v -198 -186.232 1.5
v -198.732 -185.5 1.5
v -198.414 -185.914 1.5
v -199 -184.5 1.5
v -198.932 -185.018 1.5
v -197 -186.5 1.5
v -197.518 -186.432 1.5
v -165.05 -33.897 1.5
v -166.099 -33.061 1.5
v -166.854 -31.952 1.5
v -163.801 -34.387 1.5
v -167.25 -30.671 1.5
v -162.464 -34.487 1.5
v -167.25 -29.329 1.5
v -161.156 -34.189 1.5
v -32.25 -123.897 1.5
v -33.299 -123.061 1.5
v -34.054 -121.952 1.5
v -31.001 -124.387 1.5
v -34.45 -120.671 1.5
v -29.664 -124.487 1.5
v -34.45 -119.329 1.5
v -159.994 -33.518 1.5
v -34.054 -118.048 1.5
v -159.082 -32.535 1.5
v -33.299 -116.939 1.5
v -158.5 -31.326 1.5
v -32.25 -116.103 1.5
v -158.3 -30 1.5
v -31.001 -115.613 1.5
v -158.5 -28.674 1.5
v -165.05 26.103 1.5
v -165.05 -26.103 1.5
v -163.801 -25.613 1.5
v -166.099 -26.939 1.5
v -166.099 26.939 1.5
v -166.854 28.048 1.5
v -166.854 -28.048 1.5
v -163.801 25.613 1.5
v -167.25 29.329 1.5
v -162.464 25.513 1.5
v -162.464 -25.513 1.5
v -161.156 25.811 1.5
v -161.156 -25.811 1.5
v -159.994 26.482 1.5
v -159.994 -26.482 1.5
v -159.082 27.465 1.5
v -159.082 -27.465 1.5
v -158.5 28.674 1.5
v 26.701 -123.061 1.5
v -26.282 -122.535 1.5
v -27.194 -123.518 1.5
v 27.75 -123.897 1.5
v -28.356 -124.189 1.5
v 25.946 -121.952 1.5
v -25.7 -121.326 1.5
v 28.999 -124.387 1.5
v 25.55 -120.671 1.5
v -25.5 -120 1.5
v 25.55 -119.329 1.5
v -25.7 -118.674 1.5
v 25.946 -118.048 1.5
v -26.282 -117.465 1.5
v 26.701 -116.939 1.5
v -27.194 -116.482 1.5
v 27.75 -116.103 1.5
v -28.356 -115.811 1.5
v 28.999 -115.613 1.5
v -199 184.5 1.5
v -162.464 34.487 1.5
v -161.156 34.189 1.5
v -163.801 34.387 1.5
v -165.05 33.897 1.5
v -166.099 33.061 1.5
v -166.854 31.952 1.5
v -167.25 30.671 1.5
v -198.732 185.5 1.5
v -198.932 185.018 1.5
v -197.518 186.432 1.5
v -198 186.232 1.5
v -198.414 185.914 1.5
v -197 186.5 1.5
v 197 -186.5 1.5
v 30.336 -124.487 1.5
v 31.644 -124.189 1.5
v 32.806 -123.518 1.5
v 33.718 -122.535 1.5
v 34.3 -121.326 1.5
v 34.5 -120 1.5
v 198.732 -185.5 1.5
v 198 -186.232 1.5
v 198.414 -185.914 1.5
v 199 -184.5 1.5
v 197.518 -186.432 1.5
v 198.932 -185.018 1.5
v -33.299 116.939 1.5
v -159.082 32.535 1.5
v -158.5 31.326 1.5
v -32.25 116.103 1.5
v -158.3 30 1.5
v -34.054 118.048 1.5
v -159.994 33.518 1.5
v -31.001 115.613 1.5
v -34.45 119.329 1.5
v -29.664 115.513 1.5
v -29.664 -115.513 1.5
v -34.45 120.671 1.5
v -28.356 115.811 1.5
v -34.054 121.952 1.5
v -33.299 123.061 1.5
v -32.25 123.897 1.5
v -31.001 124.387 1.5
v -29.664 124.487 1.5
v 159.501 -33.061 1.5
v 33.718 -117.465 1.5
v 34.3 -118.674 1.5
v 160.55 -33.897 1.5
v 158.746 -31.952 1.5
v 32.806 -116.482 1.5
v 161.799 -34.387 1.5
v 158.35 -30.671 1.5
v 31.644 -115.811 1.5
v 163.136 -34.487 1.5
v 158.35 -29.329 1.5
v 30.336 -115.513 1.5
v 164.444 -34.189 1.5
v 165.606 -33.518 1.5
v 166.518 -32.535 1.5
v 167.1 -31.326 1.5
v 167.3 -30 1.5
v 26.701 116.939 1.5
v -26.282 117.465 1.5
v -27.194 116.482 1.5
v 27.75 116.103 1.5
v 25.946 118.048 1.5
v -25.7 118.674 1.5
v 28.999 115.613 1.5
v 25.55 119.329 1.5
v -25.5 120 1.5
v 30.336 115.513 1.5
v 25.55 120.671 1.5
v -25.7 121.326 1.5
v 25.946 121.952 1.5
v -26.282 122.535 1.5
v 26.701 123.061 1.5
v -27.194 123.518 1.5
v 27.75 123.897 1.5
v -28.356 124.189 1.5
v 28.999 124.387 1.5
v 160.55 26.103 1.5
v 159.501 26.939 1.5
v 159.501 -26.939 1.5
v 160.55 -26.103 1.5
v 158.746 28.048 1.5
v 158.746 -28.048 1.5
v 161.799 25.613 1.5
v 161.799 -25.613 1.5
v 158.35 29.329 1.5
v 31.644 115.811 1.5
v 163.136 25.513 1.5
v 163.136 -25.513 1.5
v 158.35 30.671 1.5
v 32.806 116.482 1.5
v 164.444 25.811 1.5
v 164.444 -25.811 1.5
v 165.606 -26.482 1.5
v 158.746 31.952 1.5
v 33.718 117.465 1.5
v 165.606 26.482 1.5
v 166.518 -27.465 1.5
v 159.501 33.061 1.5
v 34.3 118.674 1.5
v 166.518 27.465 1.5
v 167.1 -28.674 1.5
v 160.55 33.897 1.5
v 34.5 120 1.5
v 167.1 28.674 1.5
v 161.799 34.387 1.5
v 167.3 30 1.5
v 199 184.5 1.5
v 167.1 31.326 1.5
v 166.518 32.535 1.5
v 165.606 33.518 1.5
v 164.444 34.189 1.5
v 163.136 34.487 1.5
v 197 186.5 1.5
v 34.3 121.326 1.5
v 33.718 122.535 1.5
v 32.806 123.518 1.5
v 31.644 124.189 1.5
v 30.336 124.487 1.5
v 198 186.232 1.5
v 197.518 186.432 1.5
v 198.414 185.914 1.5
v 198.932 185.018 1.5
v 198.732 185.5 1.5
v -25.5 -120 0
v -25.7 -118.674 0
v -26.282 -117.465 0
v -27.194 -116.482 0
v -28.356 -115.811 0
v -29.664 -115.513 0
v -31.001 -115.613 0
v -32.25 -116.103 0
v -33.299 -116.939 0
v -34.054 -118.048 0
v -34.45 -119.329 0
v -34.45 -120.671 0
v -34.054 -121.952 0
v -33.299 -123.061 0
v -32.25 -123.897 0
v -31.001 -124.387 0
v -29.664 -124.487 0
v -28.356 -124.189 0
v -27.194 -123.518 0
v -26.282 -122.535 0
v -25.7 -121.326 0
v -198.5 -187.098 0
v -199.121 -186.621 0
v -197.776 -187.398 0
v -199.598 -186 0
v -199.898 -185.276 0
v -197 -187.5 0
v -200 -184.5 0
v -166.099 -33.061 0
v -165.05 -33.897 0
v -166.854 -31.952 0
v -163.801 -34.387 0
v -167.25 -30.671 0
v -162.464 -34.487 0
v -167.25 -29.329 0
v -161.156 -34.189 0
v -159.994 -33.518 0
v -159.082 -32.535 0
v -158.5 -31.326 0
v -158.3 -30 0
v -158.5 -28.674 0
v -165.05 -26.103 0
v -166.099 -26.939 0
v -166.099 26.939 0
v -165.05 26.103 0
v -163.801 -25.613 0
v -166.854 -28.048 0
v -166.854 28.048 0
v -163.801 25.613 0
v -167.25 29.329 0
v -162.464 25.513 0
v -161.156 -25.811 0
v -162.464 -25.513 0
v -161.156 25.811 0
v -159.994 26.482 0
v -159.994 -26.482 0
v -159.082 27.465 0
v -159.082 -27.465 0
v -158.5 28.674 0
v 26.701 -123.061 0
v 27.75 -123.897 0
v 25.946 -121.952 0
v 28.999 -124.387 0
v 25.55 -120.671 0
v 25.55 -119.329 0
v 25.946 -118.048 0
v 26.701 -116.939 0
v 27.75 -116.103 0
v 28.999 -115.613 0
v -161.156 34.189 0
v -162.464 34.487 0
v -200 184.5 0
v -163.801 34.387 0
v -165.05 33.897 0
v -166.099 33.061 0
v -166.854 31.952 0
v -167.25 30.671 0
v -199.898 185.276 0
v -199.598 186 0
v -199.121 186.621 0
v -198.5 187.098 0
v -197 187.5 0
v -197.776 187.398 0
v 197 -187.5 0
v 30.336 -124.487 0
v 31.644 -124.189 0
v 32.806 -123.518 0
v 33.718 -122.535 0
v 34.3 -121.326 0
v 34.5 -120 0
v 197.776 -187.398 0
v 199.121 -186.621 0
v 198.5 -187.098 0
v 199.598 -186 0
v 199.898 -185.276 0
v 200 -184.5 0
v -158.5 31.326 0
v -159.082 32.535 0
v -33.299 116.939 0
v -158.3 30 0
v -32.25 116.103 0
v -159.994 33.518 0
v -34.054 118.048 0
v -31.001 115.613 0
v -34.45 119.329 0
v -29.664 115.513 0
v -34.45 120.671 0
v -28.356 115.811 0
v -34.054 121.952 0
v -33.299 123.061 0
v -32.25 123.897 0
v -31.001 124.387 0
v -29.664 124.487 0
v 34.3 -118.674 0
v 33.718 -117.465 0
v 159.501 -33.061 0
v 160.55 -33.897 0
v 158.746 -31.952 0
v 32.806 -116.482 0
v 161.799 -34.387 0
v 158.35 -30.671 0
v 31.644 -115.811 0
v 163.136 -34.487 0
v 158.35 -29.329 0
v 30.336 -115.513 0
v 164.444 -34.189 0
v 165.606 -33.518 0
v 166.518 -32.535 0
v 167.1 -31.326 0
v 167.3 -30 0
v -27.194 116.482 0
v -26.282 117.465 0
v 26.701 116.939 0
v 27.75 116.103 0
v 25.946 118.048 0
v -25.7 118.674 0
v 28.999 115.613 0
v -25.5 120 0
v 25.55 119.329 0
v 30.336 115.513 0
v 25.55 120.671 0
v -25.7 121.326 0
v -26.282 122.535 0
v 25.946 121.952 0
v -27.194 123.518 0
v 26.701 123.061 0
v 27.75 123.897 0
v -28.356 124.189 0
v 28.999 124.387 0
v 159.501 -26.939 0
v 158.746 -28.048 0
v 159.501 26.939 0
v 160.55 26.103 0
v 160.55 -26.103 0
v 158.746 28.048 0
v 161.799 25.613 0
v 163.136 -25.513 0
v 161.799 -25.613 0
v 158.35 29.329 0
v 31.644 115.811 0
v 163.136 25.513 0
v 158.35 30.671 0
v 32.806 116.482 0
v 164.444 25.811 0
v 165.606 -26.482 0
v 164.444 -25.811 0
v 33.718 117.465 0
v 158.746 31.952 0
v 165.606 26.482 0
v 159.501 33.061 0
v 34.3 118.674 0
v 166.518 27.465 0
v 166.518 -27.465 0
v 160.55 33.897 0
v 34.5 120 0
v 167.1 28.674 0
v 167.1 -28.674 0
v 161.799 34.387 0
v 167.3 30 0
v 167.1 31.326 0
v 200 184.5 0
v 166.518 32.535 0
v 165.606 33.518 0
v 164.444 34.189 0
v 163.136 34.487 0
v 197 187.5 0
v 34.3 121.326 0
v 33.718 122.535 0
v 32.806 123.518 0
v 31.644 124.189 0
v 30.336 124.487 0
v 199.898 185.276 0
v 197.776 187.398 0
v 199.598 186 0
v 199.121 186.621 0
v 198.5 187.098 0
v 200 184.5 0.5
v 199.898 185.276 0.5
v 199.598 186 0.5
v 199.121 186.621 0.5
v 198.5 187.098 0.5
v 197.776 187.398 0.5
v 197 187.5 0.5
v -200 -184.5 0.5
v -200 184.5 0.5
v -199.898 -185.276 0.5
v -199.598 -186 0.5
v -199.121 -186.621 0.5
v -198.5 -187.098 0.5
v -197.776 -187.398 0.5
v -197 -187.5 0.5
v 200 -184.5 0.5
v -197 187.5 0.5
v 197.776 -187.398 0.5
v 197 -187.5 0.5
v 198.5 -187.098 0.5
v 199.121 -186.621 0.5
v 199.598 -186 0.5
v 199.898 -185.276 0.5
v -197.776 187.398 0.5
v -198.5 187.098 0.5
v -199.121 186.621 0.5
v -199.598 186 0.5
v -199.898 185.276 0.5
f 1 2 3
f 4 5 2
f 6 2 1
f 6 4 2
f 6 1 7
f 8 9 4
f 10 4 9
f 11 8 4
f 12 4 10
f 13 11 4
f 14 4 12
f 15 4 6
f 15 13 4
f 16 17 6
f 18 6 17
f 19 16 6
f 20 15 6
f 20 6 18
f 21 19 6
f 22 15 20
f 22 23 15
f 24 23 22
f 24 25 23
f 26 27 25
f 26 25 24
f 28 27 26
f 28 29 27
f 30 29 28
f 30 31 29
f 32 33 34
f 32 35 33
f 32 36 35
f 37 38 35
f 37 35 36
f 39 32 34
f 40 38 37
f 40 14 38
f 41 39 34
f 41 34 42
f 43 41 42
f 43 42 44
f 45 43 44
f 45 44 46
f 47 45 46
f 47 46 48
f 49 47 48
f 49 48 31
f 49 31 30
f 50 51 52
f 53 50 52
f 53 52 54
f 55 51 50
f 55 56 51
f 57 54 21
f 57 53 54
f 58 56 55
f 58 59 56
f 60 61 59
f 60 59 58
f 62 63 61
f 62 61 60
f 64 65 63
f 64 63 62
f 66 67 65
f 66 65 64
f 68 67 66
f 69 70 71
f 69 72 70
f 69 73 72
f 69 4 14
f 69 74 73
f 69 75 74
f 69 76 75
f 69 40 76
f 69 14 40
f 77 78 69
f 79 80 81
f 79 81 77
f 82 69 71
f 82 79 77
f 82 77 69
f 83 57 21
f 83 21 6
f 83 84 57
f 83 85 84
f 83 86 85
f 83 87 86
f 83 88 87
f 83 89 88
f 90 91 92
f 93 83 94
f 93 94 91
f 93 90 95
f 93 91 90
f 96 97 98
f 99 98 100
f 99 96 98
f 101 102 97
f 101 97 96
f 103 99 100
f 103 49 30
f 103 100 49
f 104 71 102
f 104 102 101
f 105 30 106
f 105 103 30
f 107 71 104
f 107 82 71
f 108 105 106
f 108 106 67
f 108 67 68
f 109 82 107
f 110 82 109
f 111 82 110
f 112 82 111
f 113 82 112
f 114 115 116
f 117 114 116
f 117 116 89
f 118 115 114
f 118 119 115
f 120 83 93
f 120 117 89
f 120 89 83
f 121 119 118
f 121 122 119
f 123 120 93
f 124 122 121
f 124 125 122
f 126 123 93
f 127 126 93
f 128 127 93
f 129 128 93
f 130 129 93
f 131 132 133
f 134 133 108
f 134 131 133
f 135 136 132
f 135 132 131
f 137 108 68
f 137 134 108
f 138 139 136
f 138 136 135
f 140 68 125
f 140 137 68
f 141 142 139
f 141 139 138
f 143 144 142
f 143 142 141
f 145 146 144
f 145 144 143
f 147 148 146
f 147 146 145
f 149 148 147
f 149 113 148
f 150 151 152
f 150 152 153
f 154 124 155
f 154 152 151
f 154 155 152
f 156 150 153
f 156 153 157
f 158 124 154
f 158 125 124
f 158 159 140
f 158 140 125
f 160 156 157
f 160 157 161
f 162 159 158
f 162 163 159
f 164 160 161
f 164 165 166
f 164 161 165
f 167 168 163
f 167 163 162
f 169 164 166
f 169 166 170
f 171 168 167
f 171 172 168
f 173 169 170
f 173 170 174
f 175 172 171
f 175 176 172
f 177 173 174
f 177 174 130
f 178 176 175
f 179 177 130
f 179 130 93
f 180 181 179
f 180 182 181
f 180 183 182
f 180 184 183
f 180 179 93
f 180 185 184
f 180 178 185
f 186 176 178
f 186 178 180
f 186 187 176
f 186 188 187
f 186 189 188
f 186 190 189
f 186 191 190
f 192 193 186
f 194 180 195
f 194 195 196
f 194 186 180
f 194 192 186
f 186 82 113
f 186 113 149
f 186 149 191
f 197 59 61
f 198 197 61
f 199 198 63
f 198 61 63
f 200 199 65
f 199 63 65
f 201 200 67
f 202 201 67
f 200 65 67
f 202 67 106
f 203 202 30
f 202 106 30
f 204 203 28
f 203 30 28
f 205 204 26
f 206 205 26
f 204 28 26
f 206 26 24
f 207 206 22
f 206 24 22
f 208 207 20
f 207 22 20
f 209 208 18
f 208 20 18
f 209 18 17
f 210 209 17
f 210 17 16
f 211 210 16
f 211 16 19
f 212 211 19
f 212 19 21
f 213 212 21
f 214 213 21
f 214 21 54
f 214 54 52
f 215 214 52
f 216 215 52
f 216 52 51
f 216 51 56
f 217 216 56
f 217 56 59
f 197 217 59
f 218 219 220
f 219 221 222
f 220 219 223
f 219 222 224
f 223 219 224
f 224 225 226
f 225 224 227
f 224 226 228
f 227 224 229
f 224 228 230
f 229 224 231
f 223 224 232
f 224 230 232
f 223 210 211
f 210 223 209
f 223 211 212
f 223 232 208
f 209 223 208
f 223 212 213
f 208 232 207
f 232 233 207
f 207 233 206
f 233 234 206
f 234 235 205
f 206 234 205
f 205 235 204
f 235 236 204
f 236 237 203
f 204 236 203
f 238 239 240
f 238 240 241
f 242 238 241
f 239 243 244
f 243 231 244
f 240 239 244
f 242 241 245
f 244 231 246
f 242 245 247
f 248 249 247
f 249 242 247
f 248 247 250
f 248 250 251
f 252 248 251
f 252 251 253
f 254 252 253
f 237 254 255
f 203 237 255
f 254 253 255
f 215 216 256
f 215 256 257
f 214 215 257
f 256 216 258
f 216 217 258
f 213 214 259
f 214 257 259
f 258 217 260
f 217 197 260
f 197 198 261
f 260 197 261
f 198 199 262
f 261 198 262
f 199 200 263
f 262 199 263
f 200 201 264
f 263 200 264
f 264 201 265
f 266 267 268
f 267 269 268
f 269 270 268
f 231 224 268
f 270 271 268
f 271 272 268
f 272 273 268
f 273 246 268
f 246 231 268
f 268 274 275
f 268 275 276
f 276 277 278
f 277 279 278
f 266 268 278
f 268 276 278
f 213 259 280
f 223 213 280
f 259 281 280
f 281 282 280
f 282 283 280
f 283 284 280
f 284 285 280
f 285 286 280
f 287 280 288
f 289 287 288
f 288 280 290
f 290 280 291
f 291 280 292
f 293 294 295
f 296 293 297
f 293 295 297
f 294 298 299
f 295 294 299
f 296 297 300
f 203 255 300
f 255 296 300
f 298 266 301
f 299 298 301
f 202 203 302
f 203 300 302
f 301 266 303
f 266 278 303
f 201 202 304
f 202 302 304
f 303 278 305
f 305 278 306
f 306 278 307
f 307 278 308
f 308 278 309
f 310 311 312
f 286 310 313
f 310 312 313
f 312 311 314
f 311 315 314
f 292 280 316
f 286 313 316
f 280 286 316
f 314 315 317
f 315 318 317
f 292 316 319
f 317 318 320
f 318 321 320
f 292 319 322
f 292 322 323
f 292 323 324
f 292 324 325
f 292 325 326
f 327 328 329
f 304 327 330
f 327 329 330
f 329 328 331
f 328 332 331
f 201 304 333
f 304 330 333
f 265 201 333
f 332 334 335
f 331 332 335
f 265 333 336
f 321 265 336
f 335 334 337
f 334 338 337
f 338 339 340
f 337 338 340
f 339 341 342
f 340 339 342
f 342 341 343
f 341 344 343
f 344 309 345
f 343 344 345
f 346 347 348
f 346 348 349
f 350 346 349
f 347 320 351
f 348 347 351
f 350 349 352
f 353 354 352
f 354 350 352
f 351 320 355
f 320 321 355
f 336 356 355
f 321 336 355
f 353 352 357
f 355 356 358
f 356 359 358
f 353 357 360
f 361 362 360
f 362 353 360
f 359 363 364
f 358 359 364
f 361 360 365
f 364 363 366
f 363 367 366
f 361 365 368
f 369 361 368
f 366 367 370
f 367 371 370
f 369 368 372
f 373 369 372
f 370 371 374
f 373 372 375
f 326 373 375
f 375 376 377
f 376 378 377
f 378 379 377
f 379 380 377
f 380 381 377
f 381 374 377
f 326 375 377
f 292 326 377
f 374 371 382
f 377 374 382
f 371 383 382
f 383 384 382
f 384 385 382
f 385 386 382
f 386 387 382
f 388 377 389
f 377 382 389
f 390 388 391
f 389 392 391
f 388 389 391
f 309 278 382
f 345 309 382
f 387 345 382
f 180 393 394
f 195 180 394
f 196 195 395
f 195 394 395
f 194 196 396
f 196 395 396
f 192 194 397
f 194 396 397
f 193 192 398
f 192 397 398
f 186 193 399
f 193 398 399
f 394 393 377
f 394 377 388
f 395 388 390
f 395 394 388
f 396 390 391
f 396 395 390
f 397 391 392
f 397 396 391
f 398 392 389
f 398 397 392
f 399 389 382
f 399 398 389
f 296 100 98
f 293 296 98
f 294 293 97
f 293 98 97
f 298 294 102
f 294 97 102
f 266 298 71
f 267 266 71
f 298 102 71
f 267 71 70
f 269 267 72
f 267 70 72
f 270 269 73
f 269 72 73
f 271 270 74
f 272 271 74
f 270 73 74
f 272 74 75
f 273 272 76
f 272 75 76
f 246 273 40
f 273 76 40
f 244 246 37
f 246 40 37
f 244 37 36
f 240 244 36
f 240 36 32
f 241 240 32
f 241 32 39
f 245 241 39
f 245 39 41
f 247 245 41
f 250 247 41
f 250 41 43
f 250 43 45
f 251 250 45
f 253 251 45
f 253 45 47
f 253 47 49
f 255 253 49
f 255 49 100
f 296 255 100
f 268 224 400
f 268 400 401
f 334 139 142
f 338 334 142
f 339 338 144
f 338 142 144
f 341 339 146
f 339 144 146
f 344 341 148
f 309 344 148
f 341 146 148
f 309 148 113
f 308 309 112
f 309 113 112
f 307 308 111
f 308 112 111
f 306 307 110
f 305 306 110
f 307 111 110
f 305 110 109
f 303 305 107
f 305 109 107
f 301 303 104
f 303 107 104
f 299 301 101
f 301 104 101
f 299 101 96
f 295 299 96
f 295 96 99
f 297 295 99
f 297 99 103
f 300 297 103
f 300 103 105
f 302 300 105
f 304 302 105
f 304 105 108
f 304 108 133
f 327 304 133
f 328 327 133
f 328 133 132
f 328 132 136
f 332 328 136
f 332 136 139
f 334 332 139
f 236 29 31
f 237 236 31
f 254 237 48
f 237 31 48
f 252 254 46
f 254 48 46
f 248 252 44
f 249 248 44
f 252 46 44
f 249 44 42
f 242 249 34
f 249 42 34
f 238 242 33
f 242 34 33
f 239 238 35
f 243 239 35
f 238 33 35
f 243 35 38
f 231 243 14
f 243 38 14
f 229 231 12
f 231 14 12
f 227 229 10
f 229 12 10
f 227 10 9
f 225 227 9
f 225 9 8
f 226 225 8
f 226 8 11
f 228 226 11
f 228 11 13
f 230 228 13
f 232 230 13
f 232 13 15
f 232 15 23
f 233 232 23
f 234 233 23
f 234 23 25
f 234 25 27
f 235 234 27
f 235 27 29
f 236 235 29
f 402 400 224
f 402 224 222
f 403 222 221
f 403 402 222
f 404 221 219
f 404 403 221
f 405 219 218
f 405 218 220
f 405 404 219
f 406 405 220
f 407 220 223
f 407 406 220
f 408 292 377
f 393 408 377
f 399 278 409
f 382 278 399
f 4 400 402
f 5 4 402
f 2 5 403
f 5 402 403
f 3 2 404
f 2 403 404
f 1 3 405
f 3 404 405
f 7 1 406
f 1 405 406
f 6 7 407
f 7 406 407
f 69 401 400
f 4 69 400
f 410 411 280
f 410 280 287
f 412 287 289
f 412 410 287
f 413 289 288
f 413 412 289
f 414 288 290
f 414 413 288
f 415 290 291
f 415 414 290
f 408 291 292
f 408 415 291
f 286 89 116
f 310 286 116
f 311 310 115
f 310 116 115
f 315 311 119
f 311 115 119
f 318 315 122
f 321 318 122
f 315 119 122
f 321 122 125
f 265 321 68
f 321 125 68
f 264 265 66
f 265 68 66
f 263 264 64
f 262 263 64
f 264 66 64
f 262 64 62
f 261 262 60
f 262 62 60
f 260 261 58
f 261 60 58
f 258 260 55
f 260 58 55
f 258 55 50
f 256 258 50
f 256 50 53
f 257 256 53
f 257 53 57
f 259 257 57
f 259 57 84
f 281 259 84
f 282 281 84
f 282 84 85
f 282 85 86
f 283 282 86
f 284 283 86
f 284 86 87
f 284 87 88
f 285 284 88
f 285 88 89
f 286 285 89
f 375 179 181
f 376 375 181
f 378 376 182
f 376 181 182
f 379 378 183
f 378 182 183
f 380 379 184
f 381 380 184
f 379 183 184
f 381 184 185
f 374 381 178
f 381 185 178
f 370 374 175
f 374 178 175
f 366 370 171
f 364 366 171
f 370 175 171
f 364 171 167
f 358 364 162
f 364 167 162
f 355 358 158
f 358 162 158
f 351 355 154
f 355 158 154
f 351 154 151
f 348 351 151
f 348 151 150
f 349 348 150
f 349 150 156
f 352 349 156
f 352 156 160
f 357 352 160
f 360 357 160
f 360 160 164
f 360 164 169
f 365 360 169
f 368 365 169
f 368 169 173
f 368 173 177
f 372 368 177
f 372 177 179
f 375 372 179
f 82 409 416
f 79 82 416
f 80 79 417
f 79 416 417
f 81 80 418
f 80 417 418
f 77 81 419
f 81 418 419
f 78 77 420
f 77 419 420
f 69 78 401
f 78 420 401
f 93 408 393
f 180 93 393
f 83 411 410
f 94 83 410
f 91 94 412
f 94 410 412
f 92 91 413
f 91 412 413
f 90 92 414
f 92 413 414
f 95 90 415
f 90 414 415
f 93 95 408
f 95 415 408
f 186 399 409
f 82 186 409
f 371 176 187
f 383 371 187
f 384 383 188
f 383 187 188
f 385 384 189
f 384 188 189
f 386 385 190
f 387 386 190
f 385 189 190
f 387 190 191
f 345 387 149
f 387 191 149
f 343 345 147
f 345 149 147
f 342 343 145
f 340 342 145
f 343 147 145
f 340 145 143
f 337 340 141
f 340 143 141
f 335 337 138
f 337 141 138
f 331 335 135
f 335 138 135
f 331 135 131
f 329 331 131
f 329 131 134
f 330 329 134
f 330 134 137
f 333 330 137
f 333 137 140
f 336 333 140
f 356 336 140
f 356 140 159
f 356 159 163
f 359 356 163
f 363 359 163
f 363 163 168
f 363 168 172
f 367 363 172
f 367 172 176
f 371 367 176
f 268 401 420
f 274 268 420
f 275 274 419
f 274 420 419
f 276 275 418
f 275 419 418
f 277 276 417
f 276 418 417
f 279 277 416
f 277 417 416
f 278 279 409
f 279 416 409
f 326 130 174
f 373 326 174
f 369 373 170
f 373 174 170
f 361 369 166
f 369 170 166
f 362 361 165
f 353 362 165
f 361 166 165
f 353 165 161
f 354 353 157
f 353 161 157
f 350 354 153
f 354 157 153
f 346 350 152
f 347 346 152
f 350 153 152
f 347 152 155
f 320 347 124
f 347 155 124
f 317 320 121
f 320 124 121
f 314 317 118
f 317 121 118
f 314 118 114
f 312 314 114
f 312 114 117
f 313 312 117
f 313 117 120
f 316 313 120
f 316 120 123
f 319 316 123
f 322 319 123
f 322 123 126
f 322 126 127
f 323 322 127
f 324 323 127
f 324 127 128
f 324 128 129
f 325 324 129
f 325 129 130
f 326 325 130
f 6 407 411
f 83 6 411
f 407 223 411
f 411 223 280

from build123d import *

# Parameters (mm, degrees)
SKETCH1_W           = 400
SKETCH1_H           = 375
BOSS_EXTRUDE1_DEPTH = 1.5
FILLET1_R           = 3
CHAMFER1_SIZE       = 1
SKETCH6_R           = 4.5
CUT_EXTRUDE1_DEPTH  = 10


with BuildPart() as part:
    # Sketch1 → Boss-Extrude1 (new body)
    with BuildSketch(Plane.XY):
        Rectangle(SKETCH1_W, SKETCH1_H)
    extrude(amount=BOSS_EXTRUDE1_DEPTH)

    # Fillet1
    fillet1_edges = [part.edges().sort_by_distance(p)[0] for p in [
        (200, -187.5, 0.75),
        (-200, -187.5, 0.75),
        (-200, 187.5, 0.75),
        (200, 187.5, 0.75),
    ]]
    fillet(fillet1_edges, radius=FILLET1_R)

    # Chamfer1
    chamfer1_edges = [part.edges().sort_by_distance(p)[0] for p in [
        (0, -187.5, 1.5),
        (-200, 0, 1.5),
        (200, 0, 1.5),
        (0, 187.5, 1.5),
        (-199.121320344, 186.621320344, 1.5),
        (199.121320344, 186.621320344, 1.5),
        (199.121320344, -186.621320344, 1.5),
        (-199.121320344, -186.621320344, 1.5),
    ]]
    chamfer(chamfer1_edges, length=CHAMFER1_SIZE)

    # Sketch6 → Cut-Extrude1 (cut)
    with BuildSketch(Plane.XY.offset(1.5)):
        with Locations((-30, 120)):
            Circle(SKETCH6_R)
        with Locations((30, 120)):
            Circle(SKETCH6_R)
        with Locations((162.8, 30)):
            Circle(SKETCH6_R)
        with Locations((162.8, -30)):
            Circle(SKETCH6_R)
        with Locations((30, -120)):
            Circle(SKETCH6_R)
        with Locations((-30, -120)):
            Circle(SKETCH6_R)
        with Locations((-162.8, 30)):
            Circle(SKETCH6_R)
        with Locations((-162.8, -30)):
            Circle(SKETCH6_R)
    extrude(amount=-CUT_EXTRUDE1_DEPTH, mode=Mode.SUBTRACT)


solid = part.part
